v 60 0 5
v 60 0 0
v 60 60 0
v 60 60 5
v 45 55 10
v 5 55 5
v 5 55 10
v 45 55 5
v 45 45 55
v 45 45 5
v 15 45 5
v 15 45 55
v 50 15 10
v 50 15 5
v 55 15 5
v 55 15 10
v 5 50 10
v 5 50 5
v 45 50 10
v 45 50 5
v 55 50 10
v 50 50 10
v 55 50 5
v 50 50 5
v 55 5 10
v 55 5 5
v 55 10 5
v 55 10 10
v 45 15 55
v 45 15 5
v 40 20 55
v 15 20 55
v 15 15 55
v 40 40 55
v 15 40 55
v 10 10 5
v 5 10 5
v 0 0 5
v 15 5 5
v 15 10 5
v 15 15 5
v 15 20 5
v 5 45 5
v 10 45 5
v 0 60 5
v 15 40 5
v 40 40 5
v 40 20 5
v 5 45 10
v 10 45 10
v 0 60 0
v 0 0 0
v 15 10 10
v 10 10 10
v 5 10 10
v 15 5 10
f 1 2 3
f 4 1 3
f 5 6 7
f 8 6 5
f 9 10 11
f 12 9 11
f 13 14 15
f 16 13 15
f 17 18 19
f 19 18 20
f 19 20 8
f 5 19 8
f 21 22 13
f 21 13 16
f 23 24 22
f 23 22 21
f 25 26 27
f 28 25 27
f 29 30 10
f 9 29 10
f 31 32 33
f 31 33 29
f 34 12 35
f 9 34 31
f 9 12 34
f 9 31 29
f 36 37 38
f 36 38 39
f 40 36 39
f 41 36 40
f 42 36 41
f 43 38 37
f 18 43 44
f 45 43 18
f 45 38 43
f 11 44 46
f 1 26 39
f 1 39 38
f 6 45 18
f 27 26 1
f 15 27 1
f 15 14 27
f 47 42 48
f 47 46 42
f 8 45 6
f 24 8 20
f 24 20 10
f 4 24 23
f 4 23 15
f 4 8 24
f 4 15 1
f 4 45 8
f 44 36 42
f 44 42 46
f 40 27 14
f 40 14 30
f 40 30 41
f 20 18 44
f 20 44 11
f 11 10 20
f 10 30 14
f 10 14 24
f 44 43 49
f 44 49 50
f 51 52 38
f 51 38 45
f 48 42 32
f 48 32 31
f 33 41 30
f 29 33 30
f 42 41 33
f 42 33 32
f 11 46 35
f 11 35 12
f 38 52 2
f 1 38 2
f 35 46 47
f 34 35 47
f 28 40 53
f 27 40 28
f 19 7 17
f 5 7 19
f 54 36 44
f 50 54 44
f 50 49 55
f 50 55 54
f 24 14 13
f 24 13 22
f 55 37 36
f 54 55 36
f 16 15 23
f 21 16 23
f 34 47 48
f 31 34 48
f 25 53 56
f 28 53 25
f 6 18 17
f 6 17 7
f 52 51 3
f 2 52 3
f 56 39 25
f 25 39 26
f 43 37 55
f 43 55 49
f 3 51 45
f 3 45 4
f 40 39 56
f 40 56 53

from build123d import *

# Parameters (mm, degrees)
F0_W     = 60
F0_H     = 60
F1_DEPTH = 5
F2_W     = 40
F2_H     = 5
F2_W_2   = 5
F2_H_2   = 35
F3_DEPTH = 5
F4_W     = 25
F4_H     = 5
F5_DEPTH = 50


with BuildPart() as f1:
    # F0 (on Top) → F1 (new body)
    with BuildSketch(Plane.XY):
        with Locations((30, 30)):
            Rectangle(F0_W, F0_H)
    extrude(amount=F1_DEPTH)

    # F2 (on face) → F3 (join)
    with BuildSketch(Plane.XY.offset(5)):
        with Locations((35, 7.5)):
            Rectangle(F2_W, F2_H)
        with Locations((52.5, 32.5)):
            Rectangle(F2_W_2, F2_H_2)
        with Locations((25, 52.5)):
            Rectangle(F2_W, F2_H)
        with Locations((7.5, 27.5)):
            Rectangle(F2_W_2, F2_H_2)
    extrude(amount=F3_DEPTH)

    # F4 (on face) → F5 (join)
    with BuildSketch(Plane.XY.offset(5)):
        Polygon((45, 45), (40, 45), (40, 40), (40, 20), (40, 15), (45, 15), align=None)
        with Locations((27.5, 42.5)):
            Rectangle(F4_W, F4_H)
        with Locations((27.5, 17.5)):
            Rectangle(F4_W, F4_H)
    extrude(amount=F5_DEPTH)


solid = f1.part
